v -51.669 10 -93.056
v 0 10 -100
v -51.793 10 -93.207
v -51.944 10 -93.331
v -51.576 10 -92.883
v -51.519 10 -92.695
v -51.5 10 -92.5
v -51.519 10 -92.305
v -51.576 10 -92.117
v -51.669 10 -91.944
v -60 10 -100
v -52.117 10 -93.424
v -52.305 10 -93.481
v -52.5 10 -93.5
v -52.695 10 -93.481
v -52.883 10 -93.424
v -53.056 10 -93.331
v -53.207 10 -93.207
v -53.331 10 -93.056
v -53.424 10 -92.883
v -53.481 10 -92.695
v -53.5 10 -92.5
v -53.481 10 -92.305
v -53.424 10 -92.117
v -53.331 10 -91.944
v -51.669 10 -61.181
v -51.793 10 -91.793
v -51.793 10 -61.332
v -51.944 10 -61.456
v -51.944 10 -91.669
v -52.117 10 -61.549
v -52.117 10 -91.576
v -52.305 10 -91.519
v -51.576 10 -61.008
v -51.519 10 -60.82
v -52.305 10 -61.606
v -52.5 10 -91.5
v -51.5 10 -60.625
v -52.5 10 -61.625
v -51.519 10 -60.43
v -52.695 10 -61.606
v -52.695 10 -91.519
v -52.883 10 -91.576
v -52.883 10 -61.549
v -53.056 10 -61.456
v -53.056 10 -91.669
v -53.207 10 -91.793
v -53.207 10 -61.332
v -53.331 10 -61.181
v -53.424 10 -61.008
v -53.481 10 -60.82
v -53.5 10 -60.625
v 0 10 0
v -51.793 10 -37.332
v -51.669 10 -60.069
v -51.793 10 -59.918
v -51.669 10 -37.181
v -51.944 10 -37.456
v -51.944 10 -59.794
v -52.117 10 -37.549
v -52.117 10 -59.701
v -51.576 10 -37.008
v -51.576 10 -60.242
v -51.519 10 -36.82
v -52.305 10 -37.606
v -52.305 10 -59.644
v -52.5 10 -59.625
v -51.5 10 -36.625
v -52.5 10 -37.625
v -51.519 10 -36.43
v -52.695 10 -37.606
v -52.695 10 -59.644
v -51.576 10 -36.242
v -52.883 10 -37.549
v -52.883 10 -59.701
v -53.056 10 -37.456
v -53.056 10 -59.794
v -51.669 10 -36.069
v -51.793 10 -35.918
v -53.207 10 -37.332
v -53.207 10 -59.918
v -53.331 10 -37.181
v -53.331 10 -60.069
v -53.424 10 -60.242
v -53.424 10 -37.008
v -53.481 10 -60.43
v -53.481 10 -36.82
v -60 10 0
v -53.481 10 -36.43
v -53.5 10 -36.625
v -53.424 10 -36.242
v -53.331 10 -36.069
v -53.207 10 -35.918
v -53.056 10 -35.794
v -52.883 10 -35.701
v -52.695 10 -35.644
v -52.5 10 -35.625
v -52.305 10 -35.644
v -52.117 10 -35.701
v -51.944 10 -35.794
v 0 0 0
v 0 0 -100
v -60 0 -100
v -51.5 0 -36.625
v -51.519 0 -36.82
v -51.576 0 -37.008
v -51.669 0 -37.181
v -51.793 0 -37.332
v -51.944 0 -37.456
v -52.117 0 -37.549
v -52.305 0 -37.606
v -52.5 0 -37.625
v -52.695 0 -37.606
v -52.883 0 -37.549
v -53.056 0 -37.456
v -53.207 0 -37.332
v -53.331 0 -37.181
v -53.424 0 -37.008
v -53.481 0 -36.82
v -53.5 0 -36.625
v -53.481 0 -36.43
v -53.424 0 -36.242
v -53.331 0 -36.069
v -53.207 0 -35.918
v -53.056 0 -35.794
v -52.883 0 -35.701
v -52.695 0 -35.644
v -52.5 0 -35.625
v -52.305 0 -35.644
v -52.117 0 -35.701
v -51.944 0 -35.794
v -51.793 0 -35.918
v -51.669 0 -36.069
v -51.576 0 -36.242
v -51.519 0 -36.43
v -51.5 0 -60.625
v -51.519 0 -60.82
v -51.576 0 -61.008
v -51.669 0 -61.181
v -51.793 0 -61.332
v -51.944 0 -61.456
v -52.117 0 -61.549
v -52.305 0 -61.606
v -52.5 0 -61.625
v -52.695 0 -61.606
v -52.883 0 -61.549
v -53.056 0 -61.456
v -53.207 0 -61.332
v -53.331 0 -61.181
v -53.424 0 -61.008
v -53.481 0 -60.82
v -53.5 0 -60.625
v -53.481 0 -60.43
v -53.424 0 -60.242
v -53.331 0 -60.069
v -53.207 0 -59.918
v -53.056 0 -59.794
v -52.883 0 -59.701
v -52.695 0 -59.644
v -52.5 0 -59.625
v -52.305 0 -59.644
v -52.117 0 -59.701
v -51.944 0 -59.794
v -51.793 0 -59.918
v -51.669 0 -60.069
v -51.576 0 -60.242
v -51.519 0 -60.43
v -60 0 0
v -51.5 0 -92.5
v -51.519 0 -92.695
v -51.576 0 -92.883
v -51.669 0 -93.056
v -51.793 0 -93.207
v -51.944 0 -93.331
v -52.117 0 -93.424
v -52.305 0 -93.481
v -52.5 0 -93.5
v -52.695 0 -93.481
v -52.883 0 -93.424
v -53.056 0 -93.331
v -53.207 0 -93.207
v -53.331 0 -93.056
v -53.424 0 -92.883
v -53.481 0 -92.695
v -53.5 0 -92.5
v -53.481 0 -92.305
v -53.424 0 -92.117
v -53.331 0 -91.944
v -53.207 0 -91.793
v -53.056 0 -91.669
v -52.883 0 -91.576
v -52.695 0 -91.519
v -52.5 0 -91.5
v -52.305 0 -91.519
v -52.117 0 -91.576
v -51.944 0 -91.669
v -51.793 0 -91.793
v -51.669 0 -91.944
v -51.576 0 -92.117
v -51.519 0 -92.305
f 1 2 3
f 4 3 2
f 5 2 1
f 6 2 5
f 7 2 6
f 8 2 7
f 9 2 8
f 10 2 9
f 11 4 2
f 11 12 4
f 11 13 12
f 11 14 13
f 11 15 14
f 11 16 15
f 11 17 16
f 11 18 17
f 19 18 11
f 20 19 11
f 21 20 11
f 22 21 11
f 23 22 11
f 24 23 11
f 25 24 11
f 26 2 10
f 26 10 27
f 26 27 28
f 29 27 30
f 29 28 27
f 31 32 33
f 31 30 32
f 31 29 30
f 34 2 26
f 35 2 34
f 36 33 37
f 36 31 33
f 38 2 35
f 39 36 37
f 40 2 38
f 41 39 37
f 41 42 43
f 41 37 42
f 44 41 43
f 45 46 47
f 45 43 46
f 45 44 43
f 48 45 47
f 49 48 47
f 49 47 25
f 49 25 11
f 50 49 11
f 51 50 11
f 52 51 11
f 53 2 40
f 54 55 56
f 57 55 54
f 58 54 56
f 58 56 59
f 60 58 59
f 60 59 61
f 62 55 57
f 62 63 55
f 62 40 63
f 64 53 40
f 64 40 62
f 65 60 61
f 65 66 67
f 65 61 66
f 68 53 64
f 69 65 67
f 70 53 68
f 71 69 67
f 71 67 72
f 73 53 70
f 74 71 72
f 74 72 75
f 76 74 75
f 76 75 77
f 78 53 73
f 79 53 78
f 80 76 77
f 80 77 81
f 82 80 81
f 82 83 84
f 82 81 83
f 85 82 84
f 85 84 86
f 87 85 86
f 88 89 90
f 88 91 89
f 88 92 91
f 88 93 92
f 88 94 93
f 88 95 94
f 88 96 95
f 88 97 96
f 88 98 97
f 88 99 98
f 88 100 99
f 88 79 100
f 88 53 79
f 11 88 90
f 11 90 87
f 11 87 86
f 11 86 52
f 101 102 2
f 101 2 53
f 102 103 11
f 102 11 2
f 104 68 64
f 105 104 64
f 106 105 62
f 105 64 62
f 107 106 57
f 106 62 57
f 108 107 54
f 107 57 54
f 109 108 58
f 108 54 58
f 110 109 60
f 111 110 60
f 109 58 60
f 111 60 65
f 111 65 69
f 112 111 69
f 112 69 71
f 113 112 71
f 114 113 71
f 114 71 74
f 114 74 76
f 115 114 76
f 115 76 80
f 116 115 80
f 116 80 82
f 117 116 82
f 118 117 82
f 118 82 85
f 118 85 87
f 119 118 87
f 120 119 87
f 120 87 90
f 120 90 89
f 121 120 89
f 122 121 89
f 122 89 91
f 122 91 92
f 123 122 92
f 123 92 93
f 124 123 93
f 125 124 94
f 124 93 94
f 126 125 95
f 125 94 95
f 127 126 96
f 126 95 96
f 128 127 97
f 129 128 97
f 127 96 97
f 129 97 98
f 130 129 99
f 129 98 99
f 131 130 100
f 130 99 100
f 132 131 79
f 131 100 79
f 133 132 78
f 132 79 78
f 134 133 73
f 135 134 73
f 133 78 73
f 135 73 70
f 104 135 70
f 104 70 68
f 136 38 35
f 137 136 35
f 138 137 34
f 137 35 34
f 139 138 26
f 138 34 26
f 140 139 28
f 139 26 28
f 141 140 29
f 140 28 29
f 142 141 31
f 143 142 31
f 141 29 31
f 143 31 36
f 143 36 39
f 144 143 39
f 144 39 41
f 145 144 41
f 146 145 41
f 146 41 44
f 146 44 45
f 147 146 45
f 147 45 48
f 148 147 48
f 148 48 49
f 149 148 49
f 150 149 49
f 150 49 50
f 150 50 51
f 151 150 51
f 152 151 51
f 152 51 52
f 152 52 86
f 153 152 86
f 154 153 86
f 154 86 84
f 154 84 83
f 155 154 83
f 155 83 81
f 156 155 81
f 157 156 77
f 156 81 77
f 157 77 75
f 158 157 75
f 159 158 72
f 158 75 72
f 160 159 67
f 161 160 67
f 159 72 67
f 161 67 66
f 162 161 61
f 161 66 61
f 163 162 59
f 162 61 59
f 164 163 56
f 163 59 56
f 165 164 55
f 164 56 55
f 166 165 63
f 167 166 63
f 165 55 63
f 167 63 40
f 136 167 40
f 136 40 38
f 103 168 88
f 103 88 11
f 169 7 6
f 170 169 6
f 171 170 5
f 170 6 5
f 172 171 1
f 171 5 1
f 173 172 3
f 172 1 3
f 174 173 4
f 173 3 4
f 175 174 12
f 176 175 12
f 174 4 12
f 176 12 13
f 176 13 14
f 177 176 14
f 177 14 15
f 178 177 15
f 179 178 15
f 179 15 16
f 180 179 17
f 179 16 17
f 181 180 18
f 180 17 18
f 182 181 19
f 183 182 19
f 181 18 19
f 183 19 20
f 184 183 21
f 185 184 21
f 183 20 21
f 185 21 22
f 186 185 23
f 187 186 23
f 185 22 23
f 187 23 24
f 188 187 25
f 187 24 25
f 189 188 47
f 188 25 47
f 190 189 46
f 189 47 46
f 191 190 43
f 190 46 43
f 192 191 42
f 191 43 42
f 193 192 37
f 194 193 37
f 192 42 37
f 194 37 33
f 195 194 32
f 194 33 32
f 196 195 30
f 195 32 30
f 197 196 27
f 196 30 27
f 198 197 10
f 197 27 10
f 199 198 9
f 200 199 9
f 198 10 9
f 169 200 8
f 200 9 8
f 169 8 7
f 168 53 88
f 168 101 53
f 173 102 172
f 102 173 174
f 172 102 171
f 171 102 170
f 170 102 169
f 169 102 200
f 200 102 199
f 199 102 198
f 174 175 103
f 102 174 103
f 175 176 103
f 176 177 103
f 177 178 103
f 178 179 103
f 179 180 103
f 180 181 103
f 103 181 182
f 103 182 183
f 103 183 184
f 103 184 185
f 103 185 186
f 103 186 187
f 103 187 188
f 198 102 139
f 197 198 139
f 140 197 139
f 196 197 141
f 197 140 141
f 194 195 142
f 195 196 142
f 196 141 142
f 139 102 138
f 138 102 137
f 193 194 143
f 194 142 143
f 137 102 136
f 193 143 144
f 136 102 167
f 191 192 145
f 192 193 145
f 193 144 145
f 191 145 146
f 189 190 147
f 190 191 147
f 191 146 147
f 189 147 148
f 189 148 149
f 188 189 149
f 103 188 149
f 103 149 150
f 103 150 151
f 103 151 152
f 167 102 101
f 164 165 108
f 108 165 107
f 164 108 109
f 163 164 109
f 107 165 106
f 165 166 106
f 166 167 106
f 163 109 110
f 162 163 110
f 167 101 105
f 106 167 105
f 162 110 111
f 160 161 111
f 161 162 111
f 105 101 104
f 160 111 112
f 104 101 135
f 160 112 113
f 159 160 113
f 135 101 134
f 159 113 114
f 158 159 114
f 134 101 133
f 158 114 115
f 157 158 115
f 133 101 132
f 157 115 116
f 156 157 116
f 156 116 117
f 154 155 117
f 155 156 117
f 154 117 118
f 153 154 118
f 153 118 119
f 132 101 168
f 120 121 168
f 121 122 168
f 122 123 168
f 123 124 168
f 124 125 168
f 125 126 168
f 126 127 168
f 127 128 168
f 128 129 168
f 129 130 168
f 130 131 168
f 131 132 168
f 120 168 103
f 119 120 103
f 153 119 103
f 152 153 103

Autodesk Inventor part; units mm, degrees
ref_plane "YZ Plane" through (0, 0, 0) normal (1, 0, 0) x (0, 1, 0)
ref_plane "XZ Plane" through (0, 0, 0) normal (0, 1, 0) x (-1, 0, 0)
ref_plane "XY Plane" through (0, 0, 0) normal (0, 0, 1) x (1, 0, 0)
sketch "Sketch1" plane through (0, 0, 0) normal (0, 1, 0) x (-1, 0, 0)
  line L0 (0, 0) -> (60, 0)
  line L1 (60, 0) -> (60, -100)
  line L2 (60, -100) -> (0, -100)
  line L3 (0, -100) -> (0, 0)
  dimension "d0" = 60
  dimension "d1" = 100
extrude "Extrusion1" add sketch "Sketch1" along normal blind 10
sketch "Sketch2" plane through (0, 10, 0) normal (0, 1, 0) x (1, 0, 0)
  circle A0 centre (-52.5, 60.625) radius 1
  line L0 (0, 100) -> (-60, 100) projected
  line L1 (-60, 100) -> (-60, 0) projected
  point P0 (0, 0)
  dimension "d4" = 2
  dimension "d5" = 39.375
  dimension "d6" = 7.5
extrude "Extrusion2" cut sketch "Sketch2" against normal blind 10
sketch "Sketch3" plane through (0, 10, 0) normal (0, 1, 0) x (1, 0, 0)
  circle A0 centre (-52.5, 36.625) radius 1
  circle A1 centre (-52.5, 60.625) radius 1 projected
  point P0 (0, 0)
  dimension "d9" = 2
  dimension "d10" = 24
  dimension "d11" = 0
extrude "Extrusion3" cut sketch "Sketch3" against normal blind 10 contours A0
sketch "Sketch4" plane through (0, 10, 0) normal (0, 1, 0) x (1, 0, 0)
  circle A0 centre (-52.5, 92.5) radius 1
  line L0 (0, 100) -> (-60, 100) projected
  line L1 (-60, 100) -> (-60, 0) projected
  point P0 (0, 0)
  dimension "d14" = 2
  dimension "d15" = 7.5
  dimension "d16" = 7.5
extrude "Extrusion4" cut sketch "Sketch4" against normal blind 10
properties part number "temp back plate"
